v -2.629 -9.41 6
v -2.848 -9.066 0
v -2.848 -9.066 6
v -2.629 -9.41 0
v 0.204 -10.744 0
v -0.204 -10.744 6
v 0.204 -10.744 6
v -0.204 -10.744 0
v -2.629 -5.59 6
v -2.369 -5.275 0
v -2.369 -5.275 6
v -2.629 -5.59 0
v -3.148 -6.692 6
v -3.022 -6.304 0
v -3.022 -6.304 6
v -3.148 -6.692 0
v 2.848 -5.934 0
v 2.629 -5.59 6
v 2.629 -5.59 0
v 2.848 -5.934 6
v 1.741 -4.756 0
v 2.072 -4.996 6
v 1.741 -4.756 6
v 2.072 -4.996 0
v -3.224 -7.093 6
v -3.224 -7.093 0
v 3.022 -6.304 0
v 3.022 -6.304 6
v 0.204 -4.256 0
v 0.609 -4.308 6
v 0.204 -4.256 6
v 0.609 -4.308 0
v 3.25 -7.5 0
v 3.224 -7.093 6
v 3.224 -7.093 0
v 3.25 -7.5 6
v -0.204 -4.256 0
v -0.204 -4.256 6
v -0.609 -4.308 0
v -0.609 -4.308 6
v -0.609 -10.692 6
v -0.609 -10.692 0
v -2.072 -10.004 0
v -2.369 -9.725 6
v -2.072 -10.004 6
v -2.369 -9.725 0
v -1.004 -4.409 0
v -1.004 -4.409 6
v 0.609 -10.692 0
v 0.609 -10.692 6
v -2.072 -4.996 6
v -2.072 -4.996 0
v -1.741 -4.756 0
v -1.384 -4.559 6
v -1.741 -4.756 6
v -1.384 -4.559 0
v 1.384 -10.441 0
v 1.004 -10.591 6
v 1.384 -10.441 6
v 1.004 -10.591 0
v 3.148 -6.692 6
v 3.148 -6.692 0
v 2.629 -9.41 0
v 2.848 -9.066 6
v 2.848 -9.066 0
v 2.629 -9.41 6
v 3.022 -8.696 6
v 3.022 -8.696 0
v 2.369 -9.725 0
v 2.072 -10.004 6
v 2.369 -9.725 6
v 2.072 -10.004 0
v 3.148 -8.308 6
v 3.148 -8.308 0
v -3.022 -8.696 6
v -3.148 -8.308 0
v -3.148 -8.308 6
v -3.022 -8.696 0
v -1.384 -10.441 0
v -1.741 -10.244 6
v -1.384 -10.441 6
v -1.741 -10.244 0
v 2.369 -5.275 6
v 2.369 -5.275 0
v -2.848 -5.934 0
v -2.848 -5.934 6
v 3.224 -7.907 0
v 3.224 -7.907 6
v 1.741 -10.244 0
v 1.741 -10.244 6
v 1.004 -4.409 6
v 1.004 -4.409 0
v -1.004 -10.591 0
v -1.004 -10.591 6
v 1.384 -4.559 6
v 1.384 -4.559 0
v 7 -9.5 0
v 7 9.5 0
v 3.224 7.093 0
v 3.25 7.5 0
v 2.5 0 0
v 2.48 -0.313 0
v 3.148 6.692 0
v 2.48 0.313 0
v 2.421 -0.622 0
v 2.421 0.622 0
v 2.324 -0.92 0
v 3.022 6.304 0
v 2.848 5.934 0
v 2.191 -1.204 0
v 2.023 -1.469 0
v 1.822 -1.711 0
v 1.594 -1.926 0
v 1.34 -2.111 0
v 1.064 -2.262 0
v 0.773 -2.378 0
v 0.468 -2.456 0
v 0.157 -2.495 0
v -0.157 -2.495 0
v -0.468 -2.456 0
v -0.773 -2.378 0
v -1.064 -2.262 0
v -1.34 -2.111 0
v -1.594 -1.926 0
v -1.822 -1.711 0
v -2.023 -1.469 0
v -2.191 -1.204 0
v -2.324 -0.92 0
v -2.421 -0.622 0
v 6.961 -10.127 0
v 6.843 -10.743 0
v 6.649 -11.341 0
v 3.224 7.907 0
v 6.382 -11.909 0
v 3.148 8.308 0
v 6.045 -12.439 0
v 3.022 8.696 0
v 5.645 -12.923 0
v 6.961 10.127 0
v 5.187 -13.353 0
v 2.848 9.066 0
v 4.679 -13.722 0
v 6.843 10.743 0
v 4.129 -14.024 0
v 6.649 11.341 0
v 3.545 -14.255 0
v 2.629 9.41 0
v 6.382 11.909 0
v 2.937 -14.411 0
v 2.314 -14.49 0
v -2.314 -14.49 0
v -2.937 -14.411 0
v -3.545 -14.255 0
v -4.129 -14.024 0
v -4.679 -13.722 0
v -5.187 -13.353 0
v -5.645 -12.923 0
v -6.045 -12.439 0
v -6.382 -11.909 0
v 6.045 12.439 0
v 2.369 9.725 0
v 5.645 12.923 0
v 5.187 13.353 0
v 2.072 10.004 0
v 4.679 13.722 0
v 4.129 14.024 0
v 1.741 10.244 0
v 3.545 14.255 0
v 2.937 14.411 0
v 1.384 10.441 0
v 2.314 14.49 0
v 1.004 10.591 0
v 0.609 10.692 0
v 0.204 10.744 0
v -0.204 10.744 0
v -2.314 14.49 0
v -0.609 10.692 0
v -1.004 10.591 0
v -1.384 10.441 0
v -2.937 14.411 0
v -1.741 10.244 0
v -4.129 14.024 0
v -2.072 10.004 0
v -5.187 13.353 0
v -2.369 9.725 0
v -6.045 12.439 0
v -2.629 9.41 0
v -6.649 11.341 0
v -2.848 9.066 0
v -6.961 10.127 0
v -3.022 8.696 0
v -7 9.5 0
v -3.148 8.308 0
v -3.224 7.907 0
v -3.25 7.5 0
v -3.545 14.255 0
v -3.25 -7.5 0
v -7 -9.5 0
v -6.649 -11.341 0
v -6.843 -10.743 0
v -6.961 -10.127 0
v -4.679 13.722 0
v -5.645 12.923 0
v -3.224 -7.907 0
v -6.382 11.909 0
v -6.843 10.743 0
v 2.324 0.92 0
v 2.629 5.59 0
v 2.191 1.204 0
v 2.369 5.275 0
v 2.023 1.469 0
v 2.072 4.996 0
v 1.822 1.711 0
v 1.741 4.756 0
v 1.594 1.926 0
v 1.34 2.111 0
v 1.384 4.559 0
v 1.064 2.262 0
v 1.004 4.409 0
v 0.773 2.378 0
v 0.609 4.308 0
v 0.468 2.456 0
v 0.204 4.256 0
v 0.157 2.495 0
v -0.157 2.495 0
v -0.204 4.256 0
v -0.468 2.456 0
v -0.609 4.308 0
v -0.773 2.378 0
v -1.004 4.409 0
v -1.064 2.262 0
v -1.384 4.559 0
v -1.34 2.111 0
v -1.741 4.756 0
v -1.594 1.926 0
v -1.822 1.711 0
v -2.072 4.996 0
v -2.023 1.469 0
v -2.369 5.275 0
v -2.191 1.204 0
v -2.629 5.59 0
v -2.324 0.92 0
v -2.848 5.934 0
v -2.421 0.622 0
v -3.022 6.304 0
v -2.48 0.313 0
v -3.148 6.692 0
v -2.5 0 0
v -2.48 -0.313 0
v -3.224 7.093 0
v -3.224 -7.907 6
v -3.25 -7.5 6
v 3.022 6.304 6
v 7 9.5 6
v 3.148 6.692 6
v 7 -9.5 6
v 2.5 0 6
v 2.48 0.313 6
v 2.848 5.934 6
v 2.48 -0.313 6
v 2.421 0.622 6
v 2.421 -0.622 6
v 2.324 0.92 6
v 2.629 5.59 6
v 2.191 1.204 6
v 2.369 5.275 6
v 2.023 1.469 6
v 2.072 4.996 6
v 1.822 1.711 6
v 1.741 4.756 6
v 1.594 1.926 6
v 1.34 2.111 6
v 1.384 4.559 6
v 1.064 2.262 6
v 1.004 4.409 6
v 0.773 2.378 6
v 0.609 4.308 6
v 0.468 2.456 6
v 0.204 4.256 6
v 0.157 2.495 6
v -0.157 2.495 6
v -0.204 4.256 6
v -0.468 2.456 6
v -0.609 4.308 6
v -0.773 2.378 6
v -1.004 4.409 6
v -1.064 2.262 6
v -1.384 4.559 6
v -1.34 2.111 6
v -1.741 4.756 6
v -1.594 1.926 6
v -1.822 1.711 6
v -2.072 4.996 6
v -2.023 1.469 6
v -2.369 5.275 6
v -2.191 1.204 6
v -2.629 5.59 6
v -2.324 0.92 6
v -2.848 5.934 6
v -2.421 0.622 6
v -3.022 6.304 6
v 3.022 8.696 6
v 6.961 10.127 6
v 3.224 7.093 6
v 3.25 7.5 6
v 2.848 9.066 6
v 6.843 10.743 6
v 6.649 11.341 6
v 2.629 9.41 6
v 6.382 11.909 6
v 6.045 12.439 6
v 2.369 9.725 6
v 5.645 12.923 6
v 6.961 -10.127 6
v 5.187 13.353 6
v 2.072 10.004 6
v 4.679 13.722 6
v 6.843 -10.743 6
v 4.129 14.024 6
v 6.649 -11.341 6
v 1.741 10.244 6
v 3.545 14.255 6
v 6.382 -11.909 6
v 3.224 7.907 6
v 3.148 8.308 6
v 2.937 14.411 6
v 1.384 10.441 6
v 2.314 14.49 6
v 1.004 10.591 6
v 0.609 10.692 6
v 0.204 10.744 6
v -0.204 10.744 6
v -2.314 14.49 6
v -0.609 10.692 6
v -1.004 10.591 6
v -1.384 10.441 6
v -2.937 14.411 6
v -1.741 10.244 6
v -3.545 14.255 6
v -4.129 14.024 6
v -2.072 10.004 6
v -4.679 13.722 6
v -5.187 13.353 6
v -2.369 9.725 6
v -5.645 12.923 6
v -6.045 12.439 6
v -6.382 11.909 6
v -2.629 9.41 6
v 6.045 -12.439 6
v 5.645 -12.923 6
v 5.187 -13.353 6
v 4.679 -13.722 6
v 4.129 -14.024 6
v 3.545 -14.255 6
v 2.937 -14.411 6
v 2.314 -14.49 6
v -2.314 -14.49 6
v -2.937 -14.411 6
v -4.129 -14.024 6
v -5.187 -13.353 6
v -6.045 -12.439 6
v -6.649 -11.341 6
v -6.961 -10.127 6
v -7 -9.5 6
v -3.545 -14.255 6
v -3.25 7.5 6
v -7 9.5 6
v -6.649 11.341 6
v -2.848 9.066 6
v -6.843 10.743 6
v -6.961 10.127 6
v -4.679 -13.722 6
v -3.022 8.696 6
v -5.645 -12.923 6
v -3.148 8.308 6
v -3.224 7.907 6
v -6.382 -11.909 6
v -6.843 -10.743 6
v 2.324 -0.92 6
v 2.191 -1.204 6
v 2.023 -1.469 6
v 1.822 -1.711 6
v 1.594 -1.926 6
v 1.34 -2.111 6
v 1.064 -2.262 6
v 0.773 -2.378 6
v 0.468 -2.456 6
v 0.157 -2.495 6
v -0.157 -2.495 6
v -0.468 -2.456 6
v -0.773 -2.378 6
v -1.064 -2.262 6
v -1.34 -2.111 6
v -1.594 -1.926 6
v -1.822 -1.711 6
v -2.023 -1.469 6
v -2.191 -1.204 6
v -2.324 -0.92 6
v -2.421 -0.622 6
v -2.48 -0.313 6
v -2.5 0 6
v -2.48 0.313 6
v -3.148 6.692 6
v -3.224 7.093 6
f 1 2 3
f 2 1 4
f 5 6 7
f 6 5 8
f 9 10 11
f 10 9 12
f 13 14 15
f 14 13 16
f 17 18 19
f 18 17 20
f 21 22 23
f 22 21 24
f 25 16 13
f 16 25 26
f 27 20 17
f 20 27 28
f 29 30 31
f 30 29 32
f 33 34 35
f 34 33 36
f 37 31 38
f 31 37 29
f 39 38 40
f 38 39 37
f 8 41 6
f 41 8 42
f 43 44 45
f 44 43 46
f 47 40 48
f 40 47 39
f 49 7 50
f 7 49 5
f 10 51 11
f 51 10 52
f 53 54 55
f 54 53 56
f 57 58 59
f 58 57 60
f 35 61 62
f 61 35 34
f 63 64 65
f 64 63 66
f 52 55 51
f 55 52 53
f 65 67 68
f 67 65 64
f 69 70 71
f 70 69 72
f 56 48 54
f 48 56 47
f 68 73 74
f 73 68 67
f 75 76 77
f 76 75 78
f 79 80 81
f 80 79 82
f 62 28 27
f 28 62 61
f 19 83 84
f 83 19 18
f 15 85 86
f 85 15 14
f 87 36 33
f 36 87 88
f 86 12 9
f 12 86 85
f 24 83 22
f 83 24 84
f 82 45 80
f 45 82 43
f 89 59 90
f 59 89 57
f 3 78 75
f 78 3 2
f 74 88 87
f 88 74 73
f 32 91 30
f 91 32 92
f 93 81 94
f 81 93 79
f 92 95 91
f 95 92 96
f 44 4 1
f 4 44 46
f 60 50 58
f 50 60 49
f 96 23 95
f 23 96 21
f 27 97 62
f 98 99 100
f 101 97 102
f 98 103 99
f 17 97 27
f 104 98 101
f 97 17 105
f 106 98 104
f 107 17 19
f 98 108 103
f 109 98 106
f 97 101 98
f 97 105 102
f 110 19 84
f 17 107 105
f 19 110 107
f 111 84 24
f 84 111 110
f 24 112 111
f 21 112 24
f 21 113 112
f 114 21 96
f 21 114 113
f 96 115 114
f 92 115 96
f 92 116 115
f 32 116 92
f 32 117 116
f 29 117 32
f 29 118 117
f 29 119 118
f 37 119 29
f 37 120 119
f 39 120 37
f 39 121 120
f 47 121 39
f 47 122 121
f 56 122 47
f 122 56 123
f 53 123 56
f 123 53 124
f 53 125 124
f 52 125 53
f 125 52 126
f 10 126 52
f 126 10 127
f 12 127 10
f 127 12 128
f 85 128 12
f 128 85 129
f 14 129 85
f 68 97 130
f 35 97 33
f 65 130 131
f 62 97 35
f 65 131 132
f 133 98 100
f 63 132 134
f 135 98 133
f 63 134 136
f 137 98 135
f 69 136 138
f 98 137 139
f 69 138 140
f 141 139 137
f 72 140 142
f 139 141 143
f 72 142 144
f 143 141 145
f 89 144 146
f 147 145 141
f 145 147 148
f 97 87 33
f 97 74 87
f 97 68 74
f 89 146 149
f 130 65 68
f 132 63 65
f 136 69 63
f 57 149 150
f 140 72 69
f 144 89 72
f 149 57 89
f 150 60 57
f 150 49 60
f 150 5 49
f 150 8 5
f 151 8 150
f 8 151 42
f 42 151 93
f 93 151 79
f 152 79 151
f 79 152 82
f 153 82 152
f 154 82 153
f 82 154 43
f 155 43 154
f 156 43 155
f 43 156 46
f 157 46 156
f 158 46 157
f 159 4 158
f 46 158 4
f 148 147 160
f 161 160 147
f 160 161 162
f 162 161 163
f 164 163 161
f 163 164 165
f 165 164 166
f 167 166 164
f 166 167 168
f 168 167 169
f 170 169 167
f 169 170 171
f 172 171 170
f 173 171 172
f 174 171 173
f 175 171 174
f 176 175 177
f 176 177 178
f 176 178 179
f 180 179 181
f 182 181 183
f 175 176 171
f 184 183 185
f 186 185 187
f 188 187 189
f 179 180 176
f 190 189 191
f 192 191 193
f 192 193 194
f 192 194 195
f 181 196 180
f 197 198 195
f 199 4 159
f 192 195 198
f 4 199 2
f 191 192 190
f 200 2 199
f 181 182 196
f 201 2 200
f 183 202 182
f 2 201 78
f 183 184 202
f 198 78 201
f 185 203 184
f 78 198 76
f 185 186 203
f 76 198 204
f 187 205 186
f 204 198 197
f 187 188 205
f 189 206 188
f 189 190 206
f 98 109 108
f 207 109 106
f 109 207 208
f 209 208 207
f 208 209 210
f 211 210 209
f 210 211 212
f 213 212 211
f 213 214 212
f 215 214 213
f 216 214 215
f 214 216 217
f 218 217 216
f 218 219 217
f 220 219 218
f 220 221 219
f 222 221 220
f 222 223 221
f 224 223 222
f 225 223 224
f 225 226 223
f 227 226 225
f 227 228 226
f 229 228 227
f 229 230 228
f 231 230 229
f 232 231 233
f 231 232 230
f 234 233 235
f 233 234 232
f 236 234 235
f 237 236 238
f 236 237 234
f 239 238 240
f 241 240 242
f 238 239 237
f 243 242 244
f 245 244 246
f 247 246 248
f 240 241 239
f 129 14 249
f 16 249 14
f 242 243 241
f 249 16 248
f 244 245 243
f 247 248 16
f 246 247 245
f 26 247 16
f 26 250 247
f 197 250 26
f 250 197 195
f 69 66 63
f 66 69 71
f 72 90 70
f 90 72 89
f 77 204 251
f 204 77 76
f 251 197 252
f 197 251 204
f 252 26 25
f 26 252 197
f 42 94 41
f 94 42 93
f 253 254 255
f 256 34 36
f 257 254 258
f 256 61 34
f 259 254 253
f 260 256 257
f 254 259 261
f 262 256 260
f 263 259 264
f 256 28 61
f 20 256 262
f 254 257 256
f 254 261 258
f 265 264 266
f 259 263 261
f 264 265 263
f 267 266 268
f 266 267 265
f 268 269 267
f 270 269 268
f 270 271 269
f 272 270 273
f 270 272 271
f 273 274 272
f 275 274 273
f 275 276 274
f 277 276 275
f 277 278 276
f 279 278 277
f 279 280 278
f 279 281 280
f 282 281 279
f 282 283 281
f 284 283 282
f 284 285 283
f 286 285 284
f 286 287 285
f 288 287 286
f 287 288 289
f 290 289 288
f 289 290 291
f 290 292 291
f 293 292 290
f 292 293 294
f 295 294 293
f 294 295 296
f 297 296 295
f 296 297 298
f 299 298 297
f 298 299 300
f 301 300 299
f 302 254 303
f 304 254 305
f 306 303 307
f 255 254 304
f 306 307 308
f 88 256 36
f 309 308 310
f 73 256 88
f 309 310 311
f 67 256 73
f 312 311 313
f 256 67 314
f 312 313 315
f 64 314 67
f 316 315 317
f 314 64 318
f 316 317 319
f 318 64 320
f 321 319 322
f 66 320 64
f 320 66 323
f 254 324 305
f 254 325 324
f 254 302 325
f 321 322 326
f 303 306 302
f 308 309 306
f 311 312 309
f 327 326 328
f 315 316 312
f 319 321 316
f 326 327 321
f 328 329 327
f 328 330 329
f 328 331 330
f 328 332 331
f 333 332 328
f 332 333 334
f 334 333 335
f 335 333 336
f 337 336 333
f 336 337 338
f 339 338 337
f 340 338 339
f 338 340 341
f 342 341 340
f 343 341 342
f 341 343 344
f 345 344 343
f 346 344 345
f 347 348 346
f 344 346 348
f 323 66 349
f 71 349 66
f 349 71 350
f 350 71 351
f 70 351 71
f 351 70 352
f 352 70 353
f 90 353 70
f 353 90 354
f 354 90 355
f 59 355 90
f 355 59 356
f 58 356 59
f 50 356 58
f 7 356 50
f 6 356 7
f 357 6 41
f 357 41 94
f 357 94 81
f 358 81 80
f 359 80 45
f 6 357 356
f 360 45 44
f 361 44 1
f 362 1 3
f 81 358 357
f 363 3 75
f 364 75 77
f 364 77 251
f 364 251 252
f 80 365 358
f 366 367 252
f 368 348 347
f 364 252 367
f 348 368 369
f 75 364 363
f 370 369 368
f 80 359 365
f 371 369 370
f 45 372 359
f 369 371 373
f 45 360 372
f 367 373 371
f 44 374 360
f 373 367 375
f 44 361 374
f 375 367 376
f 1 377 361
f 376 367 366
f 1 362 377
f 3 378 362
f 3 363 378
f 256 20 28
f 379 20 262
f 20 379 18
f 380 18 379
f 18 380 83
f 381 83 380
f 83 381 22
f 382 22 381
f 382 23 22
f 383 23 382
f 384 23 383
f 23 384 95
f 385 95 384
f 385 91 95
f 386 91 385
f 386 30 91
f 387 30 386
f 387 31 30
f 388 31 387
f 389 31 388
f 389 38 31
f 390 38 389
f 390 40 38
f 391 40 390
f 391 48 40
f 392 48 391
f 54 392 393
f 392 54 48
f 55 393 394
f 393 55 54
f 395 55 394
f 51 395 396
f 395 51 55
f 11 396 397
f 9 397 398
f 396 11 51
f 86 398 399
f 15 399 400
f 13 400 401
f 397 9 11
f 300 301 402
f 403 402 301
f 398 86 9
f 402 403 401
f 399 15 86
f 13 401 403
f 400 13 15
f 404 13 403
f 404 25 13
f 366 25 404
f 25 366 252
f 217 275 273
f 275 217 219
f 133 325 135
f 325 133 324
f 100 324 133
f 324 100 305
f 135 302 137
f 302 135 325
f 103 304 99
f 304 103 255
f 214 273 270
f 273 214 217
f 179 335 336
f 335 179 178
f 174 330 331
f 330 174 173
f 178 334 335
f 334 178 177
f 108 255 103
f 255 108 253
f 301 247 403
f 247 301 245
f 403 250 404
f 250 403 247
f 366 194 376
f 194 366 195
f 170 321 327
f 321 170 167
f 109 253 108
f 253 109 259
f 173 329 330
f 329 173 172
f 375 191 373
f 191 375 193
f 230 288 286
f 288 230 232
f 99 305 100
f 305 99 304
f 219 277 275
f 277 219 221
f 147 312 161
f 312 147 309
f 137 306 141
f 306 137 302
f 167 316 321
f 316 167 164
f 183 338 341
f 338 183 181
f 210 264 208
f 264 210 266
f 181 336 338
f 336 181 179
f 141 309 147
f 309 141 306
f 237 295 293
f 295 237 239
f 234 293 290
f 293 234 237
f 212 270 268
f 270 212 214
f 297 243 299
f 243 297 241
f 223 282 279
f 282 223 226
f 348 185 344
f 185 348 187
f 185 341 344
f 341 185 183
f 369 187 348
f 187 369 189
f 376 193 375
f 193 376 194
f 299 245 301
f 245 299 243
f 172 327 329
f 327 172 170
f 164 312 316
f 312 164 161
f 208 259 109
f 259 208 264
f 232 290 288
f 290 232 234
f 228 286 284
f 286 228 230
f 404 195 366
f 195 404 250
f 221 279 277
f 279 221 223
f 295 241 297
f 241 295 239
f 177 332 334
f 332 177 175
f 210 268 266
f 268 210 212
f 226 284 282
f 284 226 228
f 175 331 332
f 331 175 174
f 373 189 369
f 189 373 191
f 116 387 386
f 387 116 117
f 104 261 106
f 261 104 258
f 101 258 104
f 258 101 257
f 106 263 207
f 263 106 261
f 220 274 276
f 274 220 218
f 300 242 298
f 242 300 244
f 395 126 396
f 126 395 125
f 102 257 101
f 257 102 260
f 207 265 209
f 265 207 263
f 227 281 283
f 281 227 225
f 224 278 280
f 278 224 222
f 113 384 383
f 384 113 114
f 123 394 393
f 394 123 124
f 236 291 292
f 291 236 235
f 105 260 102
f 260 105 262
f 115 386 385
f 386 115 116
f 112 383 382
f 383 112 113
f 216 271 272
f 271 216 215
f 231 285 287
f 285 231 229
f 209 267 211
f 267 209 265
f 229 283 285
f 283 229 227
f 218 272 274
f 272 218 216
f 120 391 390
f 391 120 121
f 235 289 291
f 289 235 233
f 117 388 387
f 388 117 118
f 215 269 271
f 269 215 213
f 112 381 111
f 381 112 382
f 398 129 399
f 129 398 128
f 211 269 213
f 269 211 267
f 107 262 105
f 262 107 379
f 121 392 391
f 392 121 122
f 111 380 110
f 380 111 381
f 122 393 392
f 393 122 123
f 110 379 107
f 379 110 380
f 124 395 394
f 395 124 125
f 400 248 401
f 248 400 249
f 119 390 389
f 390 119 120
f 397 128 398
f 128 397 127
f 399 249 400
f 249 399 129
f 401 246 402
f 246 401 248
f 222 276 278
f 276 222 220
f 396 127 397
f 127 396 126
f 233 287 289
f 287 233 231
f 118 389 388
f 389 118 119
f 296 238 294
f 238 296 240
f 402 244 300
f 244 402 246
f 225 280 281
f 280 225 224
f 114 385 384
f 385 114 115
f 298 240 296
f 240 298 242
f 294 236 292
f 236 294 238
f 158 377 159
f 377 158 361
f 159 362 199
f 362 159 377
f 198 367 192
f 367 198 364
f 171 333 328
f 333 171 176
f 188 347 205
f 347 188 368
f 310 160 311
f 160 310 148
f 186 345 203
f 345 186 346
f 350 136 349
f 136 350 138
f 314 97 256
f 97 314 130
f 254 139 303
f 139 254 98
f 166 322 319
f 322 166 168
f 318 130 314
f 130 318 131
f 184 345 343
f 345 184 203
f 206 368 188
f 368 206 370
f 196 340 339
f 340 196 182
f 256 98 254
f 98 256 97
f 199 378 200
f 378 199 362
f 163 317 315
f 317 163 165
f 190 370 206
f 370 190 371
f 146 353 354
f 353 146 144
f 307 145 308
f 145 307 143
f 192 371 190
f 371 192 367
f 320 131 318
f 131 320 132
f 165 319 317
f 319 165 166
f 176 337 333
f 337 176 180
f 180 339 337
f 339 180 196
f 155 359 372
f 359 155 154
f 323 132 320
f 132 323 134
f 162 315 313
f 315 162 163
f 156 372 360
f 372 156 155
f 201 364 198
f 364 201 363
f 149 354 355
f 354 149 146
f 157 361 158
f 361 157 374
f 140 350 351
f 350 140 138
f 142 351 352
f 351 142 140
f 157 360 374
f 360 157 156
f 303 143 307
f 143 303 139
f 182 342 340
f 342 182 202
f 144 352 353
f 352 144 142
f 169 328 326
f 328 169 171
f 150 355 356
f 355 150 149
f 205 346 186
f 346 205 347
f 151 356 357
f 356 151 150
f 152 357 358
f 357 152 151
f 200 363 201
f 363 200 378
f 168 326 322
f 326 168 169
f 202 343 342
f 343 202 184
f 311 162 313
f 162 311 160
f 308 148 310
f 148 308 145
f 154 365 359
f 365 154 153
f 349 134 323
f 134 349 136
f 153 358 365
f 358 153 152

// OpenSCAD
$fn = 50;

difference() {
	union() {
		hull() {
			translate(v = [-2.0, 9.5, 0]) {
				cylinder(h = 6, r = 5);
			}
			translate(v = [2.0, 9.5, 0]) {
				cylinder(h = 6, r = 5);
			}
			translate(v = [-2.0, -9.5, 0]) {
				cylinder(h = 6, r = 5);
			}
			translate(v = [2.0, -9.5, 0]) {
				cylinder(h = 6, r = 5);
			}
		}
	}
	union() {
		translate(v = [0.0, -7.5, 0]) {
			cylinder(h = 6, r = 3.25);
		}
		translate(v = [0.0, 7.5, 0]) {
			cylinder(h = 6, r = 3.25);
		}
		cylinder(h = 6, r = 2.5);
	}
}
